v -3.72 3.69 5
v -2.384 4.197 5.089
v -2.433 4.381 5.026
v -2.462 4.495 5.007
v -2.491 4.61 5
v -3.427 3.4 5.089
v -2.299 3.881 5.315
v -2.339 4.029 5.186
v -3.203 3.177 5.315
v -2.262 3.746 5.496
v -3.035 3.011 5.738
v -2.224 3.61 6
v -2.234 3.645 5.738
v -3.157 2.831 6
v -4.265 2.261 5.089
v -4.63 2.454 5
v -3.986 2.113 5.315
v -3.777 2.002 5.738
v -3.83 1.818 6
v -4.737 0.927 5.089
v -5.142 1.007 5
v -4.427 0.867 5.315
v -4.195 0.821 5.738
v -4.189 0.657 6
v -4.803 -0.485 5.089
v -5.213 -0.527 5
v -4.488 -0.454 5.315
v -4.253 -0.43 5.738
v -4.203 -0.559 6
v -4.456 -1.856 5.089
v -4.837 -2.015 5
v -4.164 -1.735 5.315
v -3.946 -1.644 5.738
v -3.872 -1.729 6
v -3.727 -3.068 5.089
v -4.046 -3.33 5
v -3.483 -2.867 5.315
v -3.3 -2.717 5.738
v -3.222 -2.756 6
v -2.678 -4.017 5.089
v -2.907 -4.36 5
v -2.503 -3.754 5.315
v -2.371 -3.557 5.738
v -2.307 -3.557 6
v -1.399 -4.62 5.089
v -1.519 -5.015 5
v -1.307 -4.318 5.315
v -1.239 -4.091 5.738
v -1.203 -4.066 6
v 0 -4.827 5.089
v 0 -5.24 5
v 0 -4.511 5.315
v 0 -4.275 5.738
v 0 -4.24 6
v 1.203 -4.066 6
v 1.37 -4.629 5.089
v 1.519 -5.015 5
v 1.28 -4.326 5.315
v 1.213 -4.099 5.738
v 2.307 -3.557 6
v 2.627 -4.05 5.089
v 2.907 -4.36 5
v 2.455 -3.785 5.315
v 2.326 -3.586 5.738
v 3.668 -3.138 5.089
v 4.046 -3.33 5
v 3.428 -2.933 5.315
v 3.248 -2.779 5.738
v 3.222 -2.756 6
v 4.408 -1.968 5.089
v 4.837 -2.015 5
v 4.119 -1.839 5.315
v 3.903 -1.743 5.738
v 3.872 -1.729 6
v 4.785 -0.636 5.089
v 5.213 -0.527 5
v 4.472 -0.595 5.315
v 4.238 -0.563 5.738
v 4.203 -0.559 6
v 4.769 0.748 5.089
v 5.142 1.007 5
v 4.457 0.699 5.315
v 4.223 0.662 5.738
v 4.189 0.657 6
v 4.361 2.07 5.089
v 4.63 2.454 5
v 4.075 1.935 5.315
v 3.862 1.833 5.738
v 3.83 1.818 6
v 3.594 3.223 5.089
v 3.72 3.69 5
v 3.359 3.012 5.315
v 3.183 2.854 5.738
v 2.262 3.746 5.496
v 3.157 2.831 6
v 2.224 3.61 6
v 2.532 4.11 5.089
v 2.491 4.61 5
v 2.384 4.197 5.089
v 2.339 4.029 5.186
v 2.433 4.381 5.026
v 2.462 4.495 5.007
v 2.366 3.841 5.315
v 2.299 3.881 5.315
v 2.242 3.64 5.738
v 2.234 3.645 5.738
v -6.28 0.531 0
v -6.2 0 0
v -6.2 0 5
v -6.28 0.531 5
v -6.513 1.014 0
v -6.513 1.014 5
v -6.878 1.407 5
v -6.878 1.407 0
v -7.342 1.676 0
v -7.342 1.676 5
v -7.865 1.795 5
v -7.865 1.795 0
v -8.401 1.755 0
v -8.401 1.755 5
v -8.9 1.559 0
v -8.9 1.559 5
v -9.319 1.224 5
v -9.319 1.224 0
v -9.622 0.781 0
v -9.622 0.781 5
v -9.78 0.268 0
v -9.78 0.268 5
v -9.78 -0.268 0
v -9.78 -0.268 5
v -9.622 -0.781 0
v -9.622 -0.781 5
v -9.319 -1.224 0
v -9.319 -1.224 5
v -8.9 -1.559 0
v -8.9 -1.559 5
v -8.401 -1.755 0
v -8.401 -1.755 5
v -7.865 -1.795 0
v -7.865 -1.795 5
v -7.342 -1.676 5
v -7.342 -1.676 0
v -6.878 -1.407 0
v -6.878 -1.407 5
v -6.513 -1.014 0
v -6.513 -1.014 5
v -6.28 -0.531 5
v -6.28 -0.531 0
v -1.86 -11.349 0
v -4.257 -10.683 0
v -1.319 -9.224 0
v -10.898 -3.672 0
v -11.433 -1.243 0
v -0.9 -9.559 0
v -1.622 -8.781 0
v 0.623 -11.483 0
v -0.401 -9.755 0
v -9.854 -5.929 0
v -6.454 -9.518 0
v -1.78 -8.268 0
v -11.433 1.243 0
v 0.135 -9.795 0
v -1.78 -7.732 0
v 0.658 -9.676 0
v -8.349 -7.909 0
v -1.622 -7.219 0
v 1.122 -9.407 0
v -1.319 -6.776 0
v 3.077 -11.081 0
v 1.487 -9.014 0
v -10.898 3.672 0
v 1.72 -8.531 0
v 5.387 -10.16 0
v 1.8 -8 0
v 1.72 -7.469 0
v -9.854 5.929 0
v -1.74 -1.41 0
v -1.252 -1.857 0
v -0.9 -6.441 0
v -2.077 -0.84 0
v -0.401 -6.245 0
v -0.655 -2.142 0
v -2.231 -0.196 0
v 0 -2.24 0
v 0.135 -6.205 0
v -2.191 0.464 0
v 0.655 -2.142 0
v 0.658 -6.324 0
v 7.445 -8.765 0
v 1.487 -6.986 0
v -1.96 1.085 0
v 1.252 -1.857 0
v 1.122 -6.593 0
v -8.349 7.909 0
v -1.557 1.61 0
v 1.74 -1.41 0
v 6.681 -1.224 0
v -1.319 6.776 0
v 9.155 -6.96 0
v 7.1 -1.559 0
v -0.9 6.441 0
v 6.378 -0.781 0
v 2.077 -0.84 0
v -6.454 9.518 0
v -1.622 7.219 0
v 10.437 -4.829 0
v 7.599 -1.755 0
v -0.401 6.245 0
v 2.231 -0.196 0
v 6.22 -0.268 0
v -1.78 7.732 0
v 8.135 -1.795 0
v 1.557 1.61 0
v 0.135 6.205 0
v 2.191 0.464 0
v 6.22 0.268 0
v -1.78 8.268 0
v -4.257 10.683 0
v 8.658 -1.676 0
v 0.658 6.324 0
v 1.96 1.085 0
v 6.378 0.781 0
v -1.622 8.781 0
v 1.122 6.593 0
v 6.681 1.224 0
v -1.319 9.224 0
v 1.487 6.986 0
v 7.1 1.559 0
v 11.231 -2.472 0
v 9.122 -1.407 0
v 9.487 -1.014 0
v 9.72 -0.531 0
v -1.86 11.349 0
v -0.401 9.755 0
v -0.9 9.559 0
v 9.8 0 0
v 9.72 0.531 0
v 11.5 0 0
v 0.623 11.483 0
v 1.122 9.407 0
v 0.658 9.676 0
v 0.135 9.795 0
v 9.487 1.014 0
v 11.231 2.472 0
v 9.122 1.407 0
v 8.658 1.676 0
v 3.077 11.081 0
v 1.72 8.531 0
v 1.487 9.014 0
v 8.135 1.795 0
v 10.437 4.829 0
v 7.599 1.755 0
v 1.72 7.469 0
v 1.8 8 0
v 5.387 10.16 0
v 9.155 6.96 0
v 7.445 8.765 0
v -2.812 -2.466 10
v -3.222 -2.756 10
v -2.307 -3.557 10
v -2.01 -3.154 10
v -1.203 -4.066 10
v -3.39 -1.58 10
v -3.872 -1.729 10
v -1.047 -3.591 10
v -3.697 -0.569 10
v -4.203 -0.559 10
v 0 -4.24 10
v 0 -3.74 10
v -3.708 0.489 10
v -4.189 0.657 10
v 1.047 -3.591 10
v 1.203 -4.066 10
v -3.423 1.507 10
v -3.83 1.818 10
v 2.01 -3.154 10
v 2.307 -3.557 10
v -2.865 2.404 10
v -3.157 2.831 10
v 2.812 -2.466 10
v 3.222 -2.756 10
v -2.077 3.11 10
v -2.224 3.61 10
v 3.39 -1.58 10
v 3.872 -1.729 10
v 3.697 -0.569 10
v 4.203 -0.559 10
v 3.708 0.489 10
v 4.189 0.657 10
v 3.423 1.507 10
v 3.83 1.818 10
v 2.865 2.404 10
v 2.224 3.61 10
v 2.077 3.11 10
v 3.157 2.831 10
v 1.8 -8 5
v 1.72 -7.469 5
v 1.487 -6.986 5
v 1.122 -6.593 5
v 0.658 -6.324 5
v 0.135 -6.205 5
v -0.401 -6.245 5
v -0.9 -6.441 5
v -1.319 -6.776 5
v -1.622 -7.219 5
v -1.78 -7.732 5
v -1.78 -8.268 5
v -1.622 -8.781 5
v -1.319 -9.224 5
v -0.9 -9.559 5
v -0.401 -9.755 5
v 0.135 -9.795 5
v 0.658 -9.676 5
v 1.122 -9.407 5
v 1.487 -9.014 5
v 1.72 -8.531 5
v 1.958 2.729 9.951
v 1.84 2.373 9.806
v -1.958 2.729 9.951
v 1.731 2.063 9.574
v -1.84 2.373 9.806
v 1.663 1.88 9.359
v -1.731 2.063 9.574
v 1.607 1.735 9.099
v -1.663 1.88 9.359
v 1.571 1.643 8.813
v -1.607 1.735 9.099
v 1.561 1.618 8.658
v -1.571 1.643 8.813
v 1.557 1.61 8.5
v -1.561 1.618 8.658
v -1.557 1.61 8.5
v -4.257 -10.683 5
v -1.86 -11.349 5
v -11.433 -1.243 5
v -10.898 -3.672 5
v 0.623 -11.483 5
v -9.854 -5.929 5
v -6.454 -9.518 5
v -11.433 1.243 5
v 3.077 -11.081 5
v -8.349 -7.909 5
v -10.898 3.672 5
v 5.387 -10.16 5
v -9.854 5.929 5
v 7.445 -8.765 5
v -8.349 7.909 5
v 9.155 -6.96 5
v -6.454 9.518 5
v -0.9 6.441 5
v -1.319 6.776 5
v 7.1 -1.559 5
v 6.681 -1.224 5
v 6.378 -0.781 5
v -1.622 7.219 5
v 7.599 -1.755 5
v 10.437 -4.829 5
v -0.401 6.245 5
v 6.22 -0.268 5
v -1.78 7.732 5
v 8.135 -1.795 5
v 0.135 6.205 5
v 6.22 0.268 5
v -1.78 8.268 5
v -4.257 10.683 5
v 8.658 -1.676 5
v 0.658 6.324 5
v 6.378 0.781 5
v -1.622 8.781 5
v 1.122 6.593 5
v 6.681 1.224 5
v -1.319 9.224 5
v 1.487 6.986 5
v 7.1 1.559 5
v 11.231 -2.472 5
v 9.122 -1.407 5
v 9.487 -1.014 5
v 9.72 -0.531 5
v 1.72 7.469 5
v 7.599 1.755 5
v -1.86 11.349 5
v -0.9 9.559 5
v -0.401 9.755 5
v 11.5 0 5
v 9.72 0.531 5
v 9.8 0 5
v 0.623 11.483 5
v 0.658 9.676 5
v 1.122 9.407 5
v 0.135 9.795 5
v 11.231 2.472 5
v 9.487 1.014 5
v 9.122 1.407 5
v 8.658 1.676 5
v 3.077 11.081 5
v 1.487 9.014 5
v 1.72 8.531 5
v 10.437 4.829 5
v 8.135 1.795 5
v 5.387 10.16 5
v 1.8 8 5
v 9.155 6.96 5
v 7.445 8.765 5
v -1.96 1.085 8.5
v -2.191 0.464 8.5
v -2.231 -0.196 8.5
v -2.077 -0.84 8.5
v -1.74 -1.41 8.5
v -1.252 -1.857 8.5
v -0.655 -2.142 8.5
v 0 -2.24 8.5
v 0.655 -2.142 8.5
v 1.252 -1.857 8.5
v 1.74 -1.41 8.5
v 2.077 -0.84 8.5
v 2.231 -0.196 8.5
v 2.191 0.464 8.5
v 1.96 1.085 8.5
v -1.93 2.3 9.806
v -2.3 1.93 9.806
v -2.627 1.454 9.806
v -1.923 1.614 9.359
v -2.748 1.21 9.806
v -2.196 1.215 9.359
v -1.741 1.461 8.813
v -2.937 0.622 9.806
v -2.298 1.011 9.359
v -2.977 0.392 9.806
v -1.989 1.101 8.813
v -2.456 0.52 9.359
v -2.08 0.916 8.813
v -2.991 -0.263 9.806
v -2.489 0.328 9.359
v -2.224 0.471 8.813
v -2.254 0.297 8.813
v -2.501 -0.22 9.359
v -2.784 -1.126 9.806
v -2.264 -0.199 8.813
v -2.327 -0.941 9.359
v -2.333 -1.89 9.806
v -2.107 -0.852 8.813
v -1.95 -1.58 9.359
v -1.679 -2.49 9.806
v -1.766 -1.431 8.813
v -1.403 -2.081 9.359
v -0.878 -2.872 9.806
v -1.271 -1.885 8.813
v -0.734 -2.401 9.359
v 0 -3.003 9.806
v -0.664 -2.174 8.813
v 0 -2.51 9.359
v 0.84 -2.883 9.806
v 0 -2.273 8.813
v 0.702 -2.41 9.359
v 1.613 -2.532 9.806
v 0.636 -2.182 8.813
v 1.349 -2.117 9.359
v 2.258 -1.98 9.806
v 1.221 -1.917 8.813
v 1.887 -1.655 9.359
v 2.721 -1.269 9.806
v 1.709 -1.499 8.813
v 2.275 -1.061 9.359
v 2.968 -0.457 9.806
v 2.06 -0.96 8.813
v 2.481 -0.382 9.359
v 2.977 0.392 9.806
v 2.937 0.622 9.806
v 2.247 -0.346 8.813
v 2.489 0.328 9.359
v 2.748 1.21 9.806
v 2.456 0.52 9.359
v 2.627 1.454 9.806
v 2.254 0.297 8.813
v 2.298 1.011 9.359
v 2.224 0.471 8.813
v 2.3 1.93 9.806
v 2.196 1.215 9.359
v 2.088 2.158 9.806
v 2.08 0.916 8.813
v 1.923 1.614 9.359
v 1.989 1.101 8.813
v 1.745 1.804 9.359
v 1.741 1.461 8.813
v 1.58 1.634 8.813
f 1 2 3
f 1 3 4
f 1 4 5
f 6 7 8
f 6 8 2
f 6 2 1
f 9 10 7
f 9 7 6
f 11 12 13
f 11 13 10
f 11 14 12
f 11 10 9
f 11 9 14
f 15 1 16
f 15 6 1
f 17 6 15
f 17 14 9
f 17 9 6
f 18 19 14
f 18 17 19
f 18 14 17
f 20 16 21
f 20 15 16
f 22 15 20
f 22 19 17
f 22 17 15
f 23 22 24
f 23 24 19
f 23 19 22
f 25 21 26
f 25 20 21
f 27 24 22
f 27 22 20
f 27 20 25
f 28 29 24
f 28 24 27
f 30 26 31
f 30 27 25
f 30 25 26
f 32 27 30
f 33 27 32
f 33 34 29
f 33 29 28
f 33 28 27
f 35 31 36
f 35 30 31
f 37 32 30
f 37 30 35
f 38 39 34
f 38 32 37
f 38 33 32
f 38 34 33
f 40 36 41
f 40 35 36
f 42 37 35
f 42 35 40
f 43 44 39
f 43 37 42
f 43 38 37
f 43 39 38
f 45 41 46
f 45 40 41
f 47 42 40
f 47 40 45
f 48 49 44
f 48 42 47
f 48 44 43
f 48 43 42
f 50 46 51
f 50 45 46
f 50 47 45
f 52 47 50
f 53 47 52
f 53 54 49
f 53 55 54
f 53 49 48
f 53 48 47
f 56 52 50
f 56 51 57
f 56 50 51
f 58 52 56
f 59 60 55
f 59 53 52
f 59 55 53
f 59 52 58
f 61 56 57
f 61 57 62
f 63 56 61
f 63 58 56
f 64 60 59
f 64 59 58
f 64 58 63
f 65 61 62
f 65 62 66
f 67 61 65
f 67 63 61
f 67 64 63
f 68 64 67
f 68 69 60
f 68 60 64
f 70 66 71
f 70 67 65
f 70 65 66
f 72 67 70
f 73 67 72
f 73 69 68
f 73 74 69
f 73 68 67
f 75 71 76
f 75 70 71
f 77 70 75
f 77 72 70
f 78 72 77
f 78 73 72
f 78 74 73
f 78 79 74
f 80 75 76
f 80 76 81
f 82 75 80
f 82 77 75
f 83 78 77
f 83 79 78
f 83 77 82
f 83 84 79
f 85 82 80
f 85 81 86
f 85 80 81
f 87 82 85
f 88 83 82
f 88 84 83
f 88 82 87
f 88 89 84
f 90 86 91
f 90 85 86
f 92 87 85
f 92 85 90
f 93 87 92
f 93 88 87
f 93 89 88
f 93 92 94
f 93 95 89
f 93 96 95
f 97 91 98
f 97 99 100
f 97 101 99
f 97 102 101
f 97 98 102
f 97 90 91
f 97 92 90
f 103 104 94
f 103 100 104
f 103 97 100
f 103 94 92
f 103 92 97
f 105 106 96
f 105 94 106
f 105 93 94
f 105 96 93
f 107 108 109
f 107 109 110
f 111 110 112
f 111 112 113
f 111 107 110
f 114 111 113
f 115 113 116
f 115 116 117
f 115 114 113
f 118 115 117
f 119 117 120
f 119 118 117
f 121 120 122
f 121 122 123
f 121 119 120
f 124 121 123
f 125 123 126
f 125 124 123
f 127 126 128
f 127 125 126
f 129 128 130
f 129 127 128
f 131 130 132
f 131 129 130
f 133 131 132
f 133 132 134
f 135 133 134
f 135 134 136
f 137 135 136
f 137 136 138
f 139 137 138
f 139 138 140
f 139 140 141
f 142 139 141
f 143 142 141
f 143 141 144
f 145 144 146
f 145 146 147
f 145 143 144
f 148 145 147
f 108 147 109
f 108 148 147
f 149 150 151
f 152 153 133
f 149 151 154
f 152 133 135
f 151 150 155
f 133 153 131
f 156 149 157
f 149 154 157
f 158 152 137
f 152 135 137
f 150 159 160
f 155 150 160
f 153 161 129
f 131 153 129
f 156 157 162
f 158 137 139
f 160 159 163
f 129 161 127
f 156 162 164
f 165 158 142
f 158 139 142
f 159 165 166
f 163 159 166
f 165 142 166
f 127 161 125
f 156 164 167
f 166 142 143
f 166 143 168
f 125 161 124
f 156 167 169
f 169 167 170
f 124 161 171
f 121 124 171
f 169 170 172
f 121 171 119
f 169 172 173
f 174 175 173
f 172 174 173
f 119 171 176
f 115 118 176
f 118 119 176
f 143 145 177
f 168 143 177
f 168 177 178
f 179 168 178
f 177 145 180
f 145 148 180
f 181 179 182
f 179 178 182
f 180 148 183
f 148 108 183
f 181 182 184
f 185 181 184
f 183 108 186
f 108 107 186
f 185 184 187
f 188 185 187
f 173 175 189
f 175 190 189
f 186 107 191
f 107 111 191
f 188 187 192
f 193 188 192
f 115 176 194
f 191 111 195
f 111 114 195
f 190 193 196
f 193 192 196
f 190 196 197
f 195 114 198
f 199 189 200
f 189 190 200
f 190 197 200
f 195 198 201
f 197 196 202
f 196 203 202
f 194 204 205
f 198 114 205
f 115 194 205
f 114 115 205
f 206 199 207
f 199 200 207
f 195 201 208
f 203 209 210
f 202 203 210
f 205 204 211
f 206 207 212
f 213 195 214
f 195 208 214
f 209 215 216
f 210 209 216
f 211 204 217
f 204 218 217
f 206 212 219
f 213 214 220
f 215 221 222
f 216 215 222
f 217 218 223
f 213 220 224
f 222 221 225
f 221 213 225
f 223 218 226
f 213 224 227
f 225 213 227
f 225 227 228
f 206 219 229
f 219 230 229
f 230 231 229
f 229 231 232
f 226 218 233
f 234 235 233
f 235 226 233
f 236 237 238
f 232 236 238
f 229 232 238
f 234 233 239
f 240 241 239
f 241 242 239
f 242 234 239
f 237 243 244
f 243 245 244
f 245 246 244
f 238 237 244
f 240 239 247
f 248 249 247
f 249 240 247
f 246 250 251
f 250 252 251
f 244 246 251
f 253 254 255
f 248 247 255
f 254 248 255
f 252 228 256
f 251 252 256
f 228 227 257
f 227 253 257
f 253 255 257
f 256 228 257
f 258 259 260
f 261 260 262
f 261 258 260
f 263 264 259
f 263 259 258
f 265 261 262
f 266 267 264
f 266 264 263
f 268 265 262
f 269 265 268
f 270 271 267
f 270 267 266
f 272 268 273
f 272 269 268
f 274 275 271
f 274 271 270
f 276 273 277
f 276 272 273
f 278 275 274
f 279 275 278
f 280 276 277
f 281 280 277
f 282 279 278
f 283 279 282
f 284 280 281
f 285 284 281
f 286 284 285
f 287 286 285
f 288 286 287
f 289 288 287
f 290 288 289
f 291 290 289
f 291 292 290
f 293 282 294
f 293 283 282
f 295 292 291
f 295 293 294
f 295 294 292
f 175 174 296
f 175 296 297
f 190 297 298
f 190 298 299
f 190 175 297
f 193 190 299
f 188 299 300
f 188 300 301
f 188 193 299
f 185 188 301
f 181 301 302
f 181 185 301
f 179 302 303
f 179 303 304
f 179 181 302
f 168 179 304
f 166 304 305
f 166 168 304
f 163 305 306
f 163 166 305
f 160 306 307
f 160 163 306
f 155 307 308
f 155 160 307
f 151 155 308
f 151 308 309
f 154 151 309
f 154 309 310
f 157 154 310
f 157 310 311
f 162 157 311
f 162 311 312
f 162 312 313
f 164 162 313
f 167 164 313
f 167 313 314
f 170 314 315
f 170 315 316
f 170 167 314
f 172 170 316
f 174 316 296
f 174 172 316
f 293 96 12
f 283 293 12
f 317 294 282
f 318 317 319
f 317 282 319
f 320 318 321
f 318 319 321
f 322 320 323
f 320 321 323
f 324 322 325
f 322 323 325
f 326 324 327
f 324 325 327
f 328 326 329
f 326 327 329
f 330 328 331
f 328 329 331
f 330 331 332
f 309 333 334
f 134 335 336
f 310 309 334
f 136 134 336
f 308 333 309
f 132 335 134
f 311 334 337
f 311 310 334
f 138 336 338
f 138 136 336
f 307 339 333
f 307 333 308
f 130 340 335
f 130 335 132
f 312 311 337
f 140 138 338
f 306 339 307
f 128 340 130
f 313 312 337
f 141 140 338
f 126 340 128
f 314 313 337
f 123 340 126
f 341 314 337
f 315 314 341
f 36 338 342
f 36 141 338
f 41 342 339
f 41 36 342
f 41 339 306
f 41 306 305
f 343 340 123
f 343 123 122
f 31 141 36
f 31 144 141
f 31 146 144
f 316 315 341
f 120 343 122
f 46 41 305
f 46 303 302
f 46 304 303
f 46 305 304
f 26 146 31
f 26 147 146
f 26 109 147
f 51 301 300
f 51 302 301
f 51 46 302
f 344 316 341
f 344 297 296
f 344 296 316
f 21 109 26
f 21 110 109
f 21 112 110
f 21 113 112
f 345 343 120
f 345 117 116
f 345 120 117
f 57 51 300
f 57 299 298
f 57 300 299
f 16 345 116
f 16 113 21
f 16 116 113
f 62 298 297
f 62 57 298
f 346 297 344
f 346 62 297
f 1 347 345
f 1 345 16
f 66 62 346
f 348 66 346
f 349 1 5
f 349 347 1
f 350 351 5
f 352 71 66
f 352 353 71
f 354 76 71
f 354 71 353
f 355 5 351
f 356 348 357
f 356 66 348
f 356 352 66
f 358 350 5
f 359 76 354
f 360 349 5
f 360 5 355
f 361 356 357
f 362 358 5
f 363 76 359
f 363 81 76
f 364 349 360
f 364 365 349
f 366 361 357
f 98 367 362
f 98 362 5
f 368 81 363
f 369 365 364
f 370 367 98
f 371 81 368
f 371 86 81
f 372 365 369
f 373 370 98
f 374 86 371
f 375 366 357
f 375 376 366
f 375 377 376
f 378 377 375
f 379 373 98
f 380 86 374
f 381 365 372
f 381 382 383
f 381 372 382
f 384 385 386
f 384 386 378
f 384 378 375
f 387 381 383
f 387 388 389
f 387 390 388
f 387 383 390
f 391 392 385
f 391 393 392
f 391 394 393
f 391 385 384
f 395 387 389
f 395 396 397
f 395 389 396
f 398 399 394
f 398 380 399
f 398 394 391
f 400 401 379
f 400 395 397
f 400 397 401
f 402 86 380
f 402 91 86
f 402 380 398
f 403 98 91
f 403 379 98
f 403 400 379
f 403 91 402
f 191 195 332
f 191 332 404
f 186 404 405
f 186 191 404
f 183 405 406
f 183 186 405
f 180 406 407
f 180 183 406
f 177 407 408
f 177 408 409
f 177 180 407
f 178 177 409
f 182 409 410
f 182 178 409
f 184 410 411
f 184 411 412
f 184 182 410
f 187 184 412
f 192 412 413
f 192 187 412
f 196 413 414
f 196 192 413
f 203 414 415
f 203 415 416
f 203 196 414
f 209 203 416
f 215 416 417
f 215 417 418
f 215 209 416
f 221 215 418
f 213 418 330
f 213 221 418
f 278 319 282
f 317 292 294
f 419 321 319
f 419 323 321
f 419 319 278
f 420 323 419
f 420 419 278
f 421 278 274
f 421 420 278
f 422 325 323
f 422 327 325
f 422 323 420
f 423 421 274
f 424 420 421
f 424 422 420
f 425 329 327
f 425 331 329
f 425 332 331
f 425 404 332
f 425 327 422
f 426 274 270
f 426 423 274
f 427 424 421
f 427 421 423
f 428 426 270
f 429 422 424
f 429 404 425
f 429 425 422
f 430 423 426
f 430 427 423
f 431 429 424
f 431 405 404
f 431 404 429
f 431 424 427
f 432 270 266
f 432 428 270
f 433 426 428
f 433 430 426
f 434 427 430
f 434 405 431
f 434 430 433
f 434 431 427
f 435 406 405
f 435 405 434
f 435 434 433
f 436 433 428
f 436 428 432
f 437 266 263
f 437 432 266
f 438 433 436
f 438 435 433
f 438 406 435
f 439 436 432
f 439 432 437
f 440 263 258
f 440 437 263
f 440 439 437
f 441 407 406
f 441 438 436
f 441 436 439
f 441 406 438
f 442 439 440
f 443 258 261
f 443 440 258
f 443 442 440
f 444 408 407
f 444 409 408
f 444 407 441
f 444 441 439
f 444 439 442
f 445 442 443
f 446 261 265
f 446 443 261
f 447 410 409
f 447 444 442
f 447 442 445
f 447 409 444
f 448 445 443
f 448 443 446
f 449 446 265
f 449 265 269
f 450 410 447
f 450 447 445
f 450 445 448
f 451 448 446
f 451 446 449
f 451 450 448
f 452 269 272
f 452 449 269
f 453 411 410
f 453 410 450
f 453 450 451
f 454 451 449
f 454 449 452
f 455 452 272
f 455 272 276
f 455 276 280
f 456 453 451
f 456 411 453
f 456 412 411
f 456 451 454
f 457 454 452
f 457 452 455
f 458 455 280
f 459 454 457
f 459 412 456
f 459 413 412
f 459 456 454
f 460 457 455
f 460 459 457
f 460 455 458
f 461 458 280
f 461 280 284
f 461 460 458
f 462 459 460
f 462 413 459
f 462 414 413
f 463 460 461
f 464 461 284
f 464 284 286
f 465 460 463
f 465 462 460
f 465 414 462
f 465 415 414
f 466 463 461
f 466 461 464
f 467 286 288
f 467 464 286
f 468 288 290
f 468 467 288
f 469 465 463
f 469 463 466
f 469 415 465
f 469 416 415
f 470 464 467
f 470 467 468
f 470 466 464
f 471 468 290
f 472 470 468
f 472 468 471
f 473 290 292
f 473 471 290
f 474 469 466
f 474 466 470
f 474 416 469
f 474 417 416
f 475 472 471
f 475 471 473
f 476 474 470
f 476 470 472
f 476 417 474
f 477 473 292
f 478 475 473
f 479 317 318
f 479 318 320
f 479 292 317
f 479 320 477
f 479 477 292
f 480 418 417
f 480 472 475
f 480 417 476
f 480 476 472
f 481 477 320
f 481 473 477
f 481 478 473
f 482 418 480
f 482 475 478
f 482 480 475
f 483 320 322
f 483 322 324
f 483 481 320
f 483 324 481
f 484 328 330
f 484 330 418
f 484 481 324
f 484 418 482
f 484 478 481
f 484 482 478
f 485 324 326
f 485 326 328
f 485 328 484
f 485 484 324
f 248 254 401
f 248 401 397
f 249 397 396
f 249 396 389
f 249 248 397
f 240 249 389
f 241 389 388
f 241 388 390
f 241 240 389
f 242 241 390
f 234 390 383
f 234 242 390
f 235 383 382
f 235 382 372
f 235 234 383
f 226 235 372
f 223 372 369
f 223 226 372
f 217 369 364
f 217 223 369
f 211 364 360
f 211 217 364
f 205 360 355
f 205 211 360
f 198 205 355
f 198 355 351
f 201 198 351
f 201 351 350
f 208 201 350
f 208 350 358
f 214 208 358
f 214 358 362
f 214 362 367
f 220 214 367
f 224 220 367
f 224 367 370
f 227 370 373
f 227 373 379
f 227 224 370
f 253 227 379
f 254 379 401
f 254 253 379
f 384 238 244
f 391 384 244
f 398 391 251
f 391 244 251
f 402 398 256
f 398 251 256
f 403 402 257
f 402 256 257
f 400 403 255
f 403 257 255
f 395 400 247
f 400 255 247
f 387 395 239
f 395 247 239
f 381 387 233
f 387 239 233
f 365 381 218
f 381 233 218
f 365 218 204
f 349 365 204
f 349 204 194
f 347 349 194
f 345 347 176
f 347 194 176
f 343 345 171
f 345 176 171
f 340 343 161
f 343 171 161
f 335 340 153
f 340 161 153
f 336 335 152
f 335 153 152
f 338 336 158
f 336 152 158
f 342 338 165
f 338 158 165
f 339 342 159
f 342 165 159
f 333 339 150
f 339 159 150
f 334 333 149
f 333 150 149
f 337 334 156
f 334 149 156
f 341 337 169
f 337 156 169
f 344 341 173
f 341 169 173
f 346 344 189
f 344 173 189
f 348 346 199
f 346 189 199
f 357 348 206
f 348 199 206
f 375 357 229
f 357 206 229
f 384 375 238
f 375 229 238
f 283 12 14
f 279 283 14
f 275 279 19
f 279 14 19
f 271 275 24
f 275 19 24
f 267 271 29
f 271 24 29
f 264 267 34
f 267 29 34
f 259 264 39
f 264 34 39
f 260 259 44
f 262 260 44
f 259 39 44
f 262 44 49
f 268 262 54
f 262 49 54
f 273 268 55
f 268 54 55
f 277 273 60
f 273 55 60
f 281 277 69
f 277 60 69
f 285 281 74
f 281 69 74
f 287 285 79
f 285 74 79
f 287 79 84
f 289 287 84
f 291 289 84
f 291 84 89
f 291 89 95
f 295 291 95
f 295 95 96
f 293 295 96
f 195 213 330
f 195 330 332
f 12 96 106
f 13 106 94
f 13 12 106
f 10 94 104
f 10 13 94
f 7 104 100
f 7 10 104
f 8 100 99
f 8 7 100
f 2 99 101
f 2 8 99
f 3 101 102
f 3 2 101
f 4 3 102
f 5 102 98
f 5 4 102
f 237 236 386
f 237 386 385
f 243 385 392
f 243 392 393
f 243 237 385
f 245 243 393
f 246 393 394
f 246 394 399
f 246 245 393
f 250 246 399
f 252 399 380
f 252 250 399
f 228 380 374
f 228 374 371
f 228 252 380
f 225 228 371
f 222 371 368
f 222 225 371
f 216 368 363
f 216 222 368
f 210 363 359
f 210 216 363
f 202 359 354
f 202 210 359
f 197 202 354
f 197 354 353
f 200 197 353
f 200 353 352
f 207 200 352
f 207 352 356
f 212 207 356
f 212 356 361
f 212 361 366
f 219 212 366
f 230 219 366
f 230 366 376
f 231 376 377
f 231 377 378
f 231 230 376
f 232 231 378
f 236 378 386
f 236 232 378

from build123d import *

# Parameters (mm, degrees)
SKETCH1_R           = 11.5
SKETCH1_R_2         = 1.8
BOSS_EXTRUDE1_DEPTH = 5
EXTRUDE_THIN1_START = 5
EXTRUDE_THIN1_DEPTH = 5
FILLET1_R           = 1
FILLET2_R           = 1.5


with BuildPart() as part:
    # Sketch1 → Boss-Extrude1 (new body)
    with BuildSketch(Plane.XY):
        Circle(SKETCH1_R)
        with Locations((0, 8)):
            Circle(SKETCH1_R_2, mode=Mode.SUBTRACT)
        with Locations((8, 0)):
            Circle(SKETCH1_R_2, mode=Mode.SUBTRACT)
        with Locations((0, -8)):
            Circle(SKETCH1_R_2, mode=Mode.SUBTRACT)
        with Locations((-8, 0)):
            Circle(SKETCH1_R_2, mode=Mode.SUBTRACT)
        with BuildLine():
            Line((1.557401682, 1.61), (-1.557401682, 1.61))
            ThreePointArc((-1.557401682, 1.61), (0, -2.24), (1.557401682, 1.61))
        make_face(mode=Mode.SUBTRACT)
    extrude(amount=BOSS_EXTRUDE1_DEPTH)

    # Sketch1<4> → Extrude-Thin1 (add)
    with BuildSketch(Plane.XY.offset(EXTRUDE_THIN1_START)):
        with BuildLine():
            Line((2.223848016, 3.61), (-2.223848016, 3.61))
            ThreePointArc((-2.223848016, 3.61), (0, -4.24), (2.223848016, 3.61))
        make_face()
        with BuildLine():
            Line((1.557401682, 1.61), (-1.557401682, 1.61))
            ThreePointArc((-1.557401682, 1.61), (0, -2.24), (1.557401682, 1.61))
        make_face(mode=Mode.SUBTRACT)
    extrude(amount=EXTRUDE_THIN1_DEPTH)

    # Fillet1
    fillet1_edges = [part.edges().sort_by_distance(p)[0] for p in [
        (0, 3.61, 5),
        (0, -4.24, 5),
    ]]
    fillet(fillet1_edges, radius=FILLET1_R)

    # Fillet2
    fillet2_edges = [part.edges().sort_by_distance(p)[0] for p in [
        (0, 1.61, 10),
        (0, -2.24, 10),
    ]]
    fillet(fillet2_edges, radius=FILLET2_R)


solid = part.part
